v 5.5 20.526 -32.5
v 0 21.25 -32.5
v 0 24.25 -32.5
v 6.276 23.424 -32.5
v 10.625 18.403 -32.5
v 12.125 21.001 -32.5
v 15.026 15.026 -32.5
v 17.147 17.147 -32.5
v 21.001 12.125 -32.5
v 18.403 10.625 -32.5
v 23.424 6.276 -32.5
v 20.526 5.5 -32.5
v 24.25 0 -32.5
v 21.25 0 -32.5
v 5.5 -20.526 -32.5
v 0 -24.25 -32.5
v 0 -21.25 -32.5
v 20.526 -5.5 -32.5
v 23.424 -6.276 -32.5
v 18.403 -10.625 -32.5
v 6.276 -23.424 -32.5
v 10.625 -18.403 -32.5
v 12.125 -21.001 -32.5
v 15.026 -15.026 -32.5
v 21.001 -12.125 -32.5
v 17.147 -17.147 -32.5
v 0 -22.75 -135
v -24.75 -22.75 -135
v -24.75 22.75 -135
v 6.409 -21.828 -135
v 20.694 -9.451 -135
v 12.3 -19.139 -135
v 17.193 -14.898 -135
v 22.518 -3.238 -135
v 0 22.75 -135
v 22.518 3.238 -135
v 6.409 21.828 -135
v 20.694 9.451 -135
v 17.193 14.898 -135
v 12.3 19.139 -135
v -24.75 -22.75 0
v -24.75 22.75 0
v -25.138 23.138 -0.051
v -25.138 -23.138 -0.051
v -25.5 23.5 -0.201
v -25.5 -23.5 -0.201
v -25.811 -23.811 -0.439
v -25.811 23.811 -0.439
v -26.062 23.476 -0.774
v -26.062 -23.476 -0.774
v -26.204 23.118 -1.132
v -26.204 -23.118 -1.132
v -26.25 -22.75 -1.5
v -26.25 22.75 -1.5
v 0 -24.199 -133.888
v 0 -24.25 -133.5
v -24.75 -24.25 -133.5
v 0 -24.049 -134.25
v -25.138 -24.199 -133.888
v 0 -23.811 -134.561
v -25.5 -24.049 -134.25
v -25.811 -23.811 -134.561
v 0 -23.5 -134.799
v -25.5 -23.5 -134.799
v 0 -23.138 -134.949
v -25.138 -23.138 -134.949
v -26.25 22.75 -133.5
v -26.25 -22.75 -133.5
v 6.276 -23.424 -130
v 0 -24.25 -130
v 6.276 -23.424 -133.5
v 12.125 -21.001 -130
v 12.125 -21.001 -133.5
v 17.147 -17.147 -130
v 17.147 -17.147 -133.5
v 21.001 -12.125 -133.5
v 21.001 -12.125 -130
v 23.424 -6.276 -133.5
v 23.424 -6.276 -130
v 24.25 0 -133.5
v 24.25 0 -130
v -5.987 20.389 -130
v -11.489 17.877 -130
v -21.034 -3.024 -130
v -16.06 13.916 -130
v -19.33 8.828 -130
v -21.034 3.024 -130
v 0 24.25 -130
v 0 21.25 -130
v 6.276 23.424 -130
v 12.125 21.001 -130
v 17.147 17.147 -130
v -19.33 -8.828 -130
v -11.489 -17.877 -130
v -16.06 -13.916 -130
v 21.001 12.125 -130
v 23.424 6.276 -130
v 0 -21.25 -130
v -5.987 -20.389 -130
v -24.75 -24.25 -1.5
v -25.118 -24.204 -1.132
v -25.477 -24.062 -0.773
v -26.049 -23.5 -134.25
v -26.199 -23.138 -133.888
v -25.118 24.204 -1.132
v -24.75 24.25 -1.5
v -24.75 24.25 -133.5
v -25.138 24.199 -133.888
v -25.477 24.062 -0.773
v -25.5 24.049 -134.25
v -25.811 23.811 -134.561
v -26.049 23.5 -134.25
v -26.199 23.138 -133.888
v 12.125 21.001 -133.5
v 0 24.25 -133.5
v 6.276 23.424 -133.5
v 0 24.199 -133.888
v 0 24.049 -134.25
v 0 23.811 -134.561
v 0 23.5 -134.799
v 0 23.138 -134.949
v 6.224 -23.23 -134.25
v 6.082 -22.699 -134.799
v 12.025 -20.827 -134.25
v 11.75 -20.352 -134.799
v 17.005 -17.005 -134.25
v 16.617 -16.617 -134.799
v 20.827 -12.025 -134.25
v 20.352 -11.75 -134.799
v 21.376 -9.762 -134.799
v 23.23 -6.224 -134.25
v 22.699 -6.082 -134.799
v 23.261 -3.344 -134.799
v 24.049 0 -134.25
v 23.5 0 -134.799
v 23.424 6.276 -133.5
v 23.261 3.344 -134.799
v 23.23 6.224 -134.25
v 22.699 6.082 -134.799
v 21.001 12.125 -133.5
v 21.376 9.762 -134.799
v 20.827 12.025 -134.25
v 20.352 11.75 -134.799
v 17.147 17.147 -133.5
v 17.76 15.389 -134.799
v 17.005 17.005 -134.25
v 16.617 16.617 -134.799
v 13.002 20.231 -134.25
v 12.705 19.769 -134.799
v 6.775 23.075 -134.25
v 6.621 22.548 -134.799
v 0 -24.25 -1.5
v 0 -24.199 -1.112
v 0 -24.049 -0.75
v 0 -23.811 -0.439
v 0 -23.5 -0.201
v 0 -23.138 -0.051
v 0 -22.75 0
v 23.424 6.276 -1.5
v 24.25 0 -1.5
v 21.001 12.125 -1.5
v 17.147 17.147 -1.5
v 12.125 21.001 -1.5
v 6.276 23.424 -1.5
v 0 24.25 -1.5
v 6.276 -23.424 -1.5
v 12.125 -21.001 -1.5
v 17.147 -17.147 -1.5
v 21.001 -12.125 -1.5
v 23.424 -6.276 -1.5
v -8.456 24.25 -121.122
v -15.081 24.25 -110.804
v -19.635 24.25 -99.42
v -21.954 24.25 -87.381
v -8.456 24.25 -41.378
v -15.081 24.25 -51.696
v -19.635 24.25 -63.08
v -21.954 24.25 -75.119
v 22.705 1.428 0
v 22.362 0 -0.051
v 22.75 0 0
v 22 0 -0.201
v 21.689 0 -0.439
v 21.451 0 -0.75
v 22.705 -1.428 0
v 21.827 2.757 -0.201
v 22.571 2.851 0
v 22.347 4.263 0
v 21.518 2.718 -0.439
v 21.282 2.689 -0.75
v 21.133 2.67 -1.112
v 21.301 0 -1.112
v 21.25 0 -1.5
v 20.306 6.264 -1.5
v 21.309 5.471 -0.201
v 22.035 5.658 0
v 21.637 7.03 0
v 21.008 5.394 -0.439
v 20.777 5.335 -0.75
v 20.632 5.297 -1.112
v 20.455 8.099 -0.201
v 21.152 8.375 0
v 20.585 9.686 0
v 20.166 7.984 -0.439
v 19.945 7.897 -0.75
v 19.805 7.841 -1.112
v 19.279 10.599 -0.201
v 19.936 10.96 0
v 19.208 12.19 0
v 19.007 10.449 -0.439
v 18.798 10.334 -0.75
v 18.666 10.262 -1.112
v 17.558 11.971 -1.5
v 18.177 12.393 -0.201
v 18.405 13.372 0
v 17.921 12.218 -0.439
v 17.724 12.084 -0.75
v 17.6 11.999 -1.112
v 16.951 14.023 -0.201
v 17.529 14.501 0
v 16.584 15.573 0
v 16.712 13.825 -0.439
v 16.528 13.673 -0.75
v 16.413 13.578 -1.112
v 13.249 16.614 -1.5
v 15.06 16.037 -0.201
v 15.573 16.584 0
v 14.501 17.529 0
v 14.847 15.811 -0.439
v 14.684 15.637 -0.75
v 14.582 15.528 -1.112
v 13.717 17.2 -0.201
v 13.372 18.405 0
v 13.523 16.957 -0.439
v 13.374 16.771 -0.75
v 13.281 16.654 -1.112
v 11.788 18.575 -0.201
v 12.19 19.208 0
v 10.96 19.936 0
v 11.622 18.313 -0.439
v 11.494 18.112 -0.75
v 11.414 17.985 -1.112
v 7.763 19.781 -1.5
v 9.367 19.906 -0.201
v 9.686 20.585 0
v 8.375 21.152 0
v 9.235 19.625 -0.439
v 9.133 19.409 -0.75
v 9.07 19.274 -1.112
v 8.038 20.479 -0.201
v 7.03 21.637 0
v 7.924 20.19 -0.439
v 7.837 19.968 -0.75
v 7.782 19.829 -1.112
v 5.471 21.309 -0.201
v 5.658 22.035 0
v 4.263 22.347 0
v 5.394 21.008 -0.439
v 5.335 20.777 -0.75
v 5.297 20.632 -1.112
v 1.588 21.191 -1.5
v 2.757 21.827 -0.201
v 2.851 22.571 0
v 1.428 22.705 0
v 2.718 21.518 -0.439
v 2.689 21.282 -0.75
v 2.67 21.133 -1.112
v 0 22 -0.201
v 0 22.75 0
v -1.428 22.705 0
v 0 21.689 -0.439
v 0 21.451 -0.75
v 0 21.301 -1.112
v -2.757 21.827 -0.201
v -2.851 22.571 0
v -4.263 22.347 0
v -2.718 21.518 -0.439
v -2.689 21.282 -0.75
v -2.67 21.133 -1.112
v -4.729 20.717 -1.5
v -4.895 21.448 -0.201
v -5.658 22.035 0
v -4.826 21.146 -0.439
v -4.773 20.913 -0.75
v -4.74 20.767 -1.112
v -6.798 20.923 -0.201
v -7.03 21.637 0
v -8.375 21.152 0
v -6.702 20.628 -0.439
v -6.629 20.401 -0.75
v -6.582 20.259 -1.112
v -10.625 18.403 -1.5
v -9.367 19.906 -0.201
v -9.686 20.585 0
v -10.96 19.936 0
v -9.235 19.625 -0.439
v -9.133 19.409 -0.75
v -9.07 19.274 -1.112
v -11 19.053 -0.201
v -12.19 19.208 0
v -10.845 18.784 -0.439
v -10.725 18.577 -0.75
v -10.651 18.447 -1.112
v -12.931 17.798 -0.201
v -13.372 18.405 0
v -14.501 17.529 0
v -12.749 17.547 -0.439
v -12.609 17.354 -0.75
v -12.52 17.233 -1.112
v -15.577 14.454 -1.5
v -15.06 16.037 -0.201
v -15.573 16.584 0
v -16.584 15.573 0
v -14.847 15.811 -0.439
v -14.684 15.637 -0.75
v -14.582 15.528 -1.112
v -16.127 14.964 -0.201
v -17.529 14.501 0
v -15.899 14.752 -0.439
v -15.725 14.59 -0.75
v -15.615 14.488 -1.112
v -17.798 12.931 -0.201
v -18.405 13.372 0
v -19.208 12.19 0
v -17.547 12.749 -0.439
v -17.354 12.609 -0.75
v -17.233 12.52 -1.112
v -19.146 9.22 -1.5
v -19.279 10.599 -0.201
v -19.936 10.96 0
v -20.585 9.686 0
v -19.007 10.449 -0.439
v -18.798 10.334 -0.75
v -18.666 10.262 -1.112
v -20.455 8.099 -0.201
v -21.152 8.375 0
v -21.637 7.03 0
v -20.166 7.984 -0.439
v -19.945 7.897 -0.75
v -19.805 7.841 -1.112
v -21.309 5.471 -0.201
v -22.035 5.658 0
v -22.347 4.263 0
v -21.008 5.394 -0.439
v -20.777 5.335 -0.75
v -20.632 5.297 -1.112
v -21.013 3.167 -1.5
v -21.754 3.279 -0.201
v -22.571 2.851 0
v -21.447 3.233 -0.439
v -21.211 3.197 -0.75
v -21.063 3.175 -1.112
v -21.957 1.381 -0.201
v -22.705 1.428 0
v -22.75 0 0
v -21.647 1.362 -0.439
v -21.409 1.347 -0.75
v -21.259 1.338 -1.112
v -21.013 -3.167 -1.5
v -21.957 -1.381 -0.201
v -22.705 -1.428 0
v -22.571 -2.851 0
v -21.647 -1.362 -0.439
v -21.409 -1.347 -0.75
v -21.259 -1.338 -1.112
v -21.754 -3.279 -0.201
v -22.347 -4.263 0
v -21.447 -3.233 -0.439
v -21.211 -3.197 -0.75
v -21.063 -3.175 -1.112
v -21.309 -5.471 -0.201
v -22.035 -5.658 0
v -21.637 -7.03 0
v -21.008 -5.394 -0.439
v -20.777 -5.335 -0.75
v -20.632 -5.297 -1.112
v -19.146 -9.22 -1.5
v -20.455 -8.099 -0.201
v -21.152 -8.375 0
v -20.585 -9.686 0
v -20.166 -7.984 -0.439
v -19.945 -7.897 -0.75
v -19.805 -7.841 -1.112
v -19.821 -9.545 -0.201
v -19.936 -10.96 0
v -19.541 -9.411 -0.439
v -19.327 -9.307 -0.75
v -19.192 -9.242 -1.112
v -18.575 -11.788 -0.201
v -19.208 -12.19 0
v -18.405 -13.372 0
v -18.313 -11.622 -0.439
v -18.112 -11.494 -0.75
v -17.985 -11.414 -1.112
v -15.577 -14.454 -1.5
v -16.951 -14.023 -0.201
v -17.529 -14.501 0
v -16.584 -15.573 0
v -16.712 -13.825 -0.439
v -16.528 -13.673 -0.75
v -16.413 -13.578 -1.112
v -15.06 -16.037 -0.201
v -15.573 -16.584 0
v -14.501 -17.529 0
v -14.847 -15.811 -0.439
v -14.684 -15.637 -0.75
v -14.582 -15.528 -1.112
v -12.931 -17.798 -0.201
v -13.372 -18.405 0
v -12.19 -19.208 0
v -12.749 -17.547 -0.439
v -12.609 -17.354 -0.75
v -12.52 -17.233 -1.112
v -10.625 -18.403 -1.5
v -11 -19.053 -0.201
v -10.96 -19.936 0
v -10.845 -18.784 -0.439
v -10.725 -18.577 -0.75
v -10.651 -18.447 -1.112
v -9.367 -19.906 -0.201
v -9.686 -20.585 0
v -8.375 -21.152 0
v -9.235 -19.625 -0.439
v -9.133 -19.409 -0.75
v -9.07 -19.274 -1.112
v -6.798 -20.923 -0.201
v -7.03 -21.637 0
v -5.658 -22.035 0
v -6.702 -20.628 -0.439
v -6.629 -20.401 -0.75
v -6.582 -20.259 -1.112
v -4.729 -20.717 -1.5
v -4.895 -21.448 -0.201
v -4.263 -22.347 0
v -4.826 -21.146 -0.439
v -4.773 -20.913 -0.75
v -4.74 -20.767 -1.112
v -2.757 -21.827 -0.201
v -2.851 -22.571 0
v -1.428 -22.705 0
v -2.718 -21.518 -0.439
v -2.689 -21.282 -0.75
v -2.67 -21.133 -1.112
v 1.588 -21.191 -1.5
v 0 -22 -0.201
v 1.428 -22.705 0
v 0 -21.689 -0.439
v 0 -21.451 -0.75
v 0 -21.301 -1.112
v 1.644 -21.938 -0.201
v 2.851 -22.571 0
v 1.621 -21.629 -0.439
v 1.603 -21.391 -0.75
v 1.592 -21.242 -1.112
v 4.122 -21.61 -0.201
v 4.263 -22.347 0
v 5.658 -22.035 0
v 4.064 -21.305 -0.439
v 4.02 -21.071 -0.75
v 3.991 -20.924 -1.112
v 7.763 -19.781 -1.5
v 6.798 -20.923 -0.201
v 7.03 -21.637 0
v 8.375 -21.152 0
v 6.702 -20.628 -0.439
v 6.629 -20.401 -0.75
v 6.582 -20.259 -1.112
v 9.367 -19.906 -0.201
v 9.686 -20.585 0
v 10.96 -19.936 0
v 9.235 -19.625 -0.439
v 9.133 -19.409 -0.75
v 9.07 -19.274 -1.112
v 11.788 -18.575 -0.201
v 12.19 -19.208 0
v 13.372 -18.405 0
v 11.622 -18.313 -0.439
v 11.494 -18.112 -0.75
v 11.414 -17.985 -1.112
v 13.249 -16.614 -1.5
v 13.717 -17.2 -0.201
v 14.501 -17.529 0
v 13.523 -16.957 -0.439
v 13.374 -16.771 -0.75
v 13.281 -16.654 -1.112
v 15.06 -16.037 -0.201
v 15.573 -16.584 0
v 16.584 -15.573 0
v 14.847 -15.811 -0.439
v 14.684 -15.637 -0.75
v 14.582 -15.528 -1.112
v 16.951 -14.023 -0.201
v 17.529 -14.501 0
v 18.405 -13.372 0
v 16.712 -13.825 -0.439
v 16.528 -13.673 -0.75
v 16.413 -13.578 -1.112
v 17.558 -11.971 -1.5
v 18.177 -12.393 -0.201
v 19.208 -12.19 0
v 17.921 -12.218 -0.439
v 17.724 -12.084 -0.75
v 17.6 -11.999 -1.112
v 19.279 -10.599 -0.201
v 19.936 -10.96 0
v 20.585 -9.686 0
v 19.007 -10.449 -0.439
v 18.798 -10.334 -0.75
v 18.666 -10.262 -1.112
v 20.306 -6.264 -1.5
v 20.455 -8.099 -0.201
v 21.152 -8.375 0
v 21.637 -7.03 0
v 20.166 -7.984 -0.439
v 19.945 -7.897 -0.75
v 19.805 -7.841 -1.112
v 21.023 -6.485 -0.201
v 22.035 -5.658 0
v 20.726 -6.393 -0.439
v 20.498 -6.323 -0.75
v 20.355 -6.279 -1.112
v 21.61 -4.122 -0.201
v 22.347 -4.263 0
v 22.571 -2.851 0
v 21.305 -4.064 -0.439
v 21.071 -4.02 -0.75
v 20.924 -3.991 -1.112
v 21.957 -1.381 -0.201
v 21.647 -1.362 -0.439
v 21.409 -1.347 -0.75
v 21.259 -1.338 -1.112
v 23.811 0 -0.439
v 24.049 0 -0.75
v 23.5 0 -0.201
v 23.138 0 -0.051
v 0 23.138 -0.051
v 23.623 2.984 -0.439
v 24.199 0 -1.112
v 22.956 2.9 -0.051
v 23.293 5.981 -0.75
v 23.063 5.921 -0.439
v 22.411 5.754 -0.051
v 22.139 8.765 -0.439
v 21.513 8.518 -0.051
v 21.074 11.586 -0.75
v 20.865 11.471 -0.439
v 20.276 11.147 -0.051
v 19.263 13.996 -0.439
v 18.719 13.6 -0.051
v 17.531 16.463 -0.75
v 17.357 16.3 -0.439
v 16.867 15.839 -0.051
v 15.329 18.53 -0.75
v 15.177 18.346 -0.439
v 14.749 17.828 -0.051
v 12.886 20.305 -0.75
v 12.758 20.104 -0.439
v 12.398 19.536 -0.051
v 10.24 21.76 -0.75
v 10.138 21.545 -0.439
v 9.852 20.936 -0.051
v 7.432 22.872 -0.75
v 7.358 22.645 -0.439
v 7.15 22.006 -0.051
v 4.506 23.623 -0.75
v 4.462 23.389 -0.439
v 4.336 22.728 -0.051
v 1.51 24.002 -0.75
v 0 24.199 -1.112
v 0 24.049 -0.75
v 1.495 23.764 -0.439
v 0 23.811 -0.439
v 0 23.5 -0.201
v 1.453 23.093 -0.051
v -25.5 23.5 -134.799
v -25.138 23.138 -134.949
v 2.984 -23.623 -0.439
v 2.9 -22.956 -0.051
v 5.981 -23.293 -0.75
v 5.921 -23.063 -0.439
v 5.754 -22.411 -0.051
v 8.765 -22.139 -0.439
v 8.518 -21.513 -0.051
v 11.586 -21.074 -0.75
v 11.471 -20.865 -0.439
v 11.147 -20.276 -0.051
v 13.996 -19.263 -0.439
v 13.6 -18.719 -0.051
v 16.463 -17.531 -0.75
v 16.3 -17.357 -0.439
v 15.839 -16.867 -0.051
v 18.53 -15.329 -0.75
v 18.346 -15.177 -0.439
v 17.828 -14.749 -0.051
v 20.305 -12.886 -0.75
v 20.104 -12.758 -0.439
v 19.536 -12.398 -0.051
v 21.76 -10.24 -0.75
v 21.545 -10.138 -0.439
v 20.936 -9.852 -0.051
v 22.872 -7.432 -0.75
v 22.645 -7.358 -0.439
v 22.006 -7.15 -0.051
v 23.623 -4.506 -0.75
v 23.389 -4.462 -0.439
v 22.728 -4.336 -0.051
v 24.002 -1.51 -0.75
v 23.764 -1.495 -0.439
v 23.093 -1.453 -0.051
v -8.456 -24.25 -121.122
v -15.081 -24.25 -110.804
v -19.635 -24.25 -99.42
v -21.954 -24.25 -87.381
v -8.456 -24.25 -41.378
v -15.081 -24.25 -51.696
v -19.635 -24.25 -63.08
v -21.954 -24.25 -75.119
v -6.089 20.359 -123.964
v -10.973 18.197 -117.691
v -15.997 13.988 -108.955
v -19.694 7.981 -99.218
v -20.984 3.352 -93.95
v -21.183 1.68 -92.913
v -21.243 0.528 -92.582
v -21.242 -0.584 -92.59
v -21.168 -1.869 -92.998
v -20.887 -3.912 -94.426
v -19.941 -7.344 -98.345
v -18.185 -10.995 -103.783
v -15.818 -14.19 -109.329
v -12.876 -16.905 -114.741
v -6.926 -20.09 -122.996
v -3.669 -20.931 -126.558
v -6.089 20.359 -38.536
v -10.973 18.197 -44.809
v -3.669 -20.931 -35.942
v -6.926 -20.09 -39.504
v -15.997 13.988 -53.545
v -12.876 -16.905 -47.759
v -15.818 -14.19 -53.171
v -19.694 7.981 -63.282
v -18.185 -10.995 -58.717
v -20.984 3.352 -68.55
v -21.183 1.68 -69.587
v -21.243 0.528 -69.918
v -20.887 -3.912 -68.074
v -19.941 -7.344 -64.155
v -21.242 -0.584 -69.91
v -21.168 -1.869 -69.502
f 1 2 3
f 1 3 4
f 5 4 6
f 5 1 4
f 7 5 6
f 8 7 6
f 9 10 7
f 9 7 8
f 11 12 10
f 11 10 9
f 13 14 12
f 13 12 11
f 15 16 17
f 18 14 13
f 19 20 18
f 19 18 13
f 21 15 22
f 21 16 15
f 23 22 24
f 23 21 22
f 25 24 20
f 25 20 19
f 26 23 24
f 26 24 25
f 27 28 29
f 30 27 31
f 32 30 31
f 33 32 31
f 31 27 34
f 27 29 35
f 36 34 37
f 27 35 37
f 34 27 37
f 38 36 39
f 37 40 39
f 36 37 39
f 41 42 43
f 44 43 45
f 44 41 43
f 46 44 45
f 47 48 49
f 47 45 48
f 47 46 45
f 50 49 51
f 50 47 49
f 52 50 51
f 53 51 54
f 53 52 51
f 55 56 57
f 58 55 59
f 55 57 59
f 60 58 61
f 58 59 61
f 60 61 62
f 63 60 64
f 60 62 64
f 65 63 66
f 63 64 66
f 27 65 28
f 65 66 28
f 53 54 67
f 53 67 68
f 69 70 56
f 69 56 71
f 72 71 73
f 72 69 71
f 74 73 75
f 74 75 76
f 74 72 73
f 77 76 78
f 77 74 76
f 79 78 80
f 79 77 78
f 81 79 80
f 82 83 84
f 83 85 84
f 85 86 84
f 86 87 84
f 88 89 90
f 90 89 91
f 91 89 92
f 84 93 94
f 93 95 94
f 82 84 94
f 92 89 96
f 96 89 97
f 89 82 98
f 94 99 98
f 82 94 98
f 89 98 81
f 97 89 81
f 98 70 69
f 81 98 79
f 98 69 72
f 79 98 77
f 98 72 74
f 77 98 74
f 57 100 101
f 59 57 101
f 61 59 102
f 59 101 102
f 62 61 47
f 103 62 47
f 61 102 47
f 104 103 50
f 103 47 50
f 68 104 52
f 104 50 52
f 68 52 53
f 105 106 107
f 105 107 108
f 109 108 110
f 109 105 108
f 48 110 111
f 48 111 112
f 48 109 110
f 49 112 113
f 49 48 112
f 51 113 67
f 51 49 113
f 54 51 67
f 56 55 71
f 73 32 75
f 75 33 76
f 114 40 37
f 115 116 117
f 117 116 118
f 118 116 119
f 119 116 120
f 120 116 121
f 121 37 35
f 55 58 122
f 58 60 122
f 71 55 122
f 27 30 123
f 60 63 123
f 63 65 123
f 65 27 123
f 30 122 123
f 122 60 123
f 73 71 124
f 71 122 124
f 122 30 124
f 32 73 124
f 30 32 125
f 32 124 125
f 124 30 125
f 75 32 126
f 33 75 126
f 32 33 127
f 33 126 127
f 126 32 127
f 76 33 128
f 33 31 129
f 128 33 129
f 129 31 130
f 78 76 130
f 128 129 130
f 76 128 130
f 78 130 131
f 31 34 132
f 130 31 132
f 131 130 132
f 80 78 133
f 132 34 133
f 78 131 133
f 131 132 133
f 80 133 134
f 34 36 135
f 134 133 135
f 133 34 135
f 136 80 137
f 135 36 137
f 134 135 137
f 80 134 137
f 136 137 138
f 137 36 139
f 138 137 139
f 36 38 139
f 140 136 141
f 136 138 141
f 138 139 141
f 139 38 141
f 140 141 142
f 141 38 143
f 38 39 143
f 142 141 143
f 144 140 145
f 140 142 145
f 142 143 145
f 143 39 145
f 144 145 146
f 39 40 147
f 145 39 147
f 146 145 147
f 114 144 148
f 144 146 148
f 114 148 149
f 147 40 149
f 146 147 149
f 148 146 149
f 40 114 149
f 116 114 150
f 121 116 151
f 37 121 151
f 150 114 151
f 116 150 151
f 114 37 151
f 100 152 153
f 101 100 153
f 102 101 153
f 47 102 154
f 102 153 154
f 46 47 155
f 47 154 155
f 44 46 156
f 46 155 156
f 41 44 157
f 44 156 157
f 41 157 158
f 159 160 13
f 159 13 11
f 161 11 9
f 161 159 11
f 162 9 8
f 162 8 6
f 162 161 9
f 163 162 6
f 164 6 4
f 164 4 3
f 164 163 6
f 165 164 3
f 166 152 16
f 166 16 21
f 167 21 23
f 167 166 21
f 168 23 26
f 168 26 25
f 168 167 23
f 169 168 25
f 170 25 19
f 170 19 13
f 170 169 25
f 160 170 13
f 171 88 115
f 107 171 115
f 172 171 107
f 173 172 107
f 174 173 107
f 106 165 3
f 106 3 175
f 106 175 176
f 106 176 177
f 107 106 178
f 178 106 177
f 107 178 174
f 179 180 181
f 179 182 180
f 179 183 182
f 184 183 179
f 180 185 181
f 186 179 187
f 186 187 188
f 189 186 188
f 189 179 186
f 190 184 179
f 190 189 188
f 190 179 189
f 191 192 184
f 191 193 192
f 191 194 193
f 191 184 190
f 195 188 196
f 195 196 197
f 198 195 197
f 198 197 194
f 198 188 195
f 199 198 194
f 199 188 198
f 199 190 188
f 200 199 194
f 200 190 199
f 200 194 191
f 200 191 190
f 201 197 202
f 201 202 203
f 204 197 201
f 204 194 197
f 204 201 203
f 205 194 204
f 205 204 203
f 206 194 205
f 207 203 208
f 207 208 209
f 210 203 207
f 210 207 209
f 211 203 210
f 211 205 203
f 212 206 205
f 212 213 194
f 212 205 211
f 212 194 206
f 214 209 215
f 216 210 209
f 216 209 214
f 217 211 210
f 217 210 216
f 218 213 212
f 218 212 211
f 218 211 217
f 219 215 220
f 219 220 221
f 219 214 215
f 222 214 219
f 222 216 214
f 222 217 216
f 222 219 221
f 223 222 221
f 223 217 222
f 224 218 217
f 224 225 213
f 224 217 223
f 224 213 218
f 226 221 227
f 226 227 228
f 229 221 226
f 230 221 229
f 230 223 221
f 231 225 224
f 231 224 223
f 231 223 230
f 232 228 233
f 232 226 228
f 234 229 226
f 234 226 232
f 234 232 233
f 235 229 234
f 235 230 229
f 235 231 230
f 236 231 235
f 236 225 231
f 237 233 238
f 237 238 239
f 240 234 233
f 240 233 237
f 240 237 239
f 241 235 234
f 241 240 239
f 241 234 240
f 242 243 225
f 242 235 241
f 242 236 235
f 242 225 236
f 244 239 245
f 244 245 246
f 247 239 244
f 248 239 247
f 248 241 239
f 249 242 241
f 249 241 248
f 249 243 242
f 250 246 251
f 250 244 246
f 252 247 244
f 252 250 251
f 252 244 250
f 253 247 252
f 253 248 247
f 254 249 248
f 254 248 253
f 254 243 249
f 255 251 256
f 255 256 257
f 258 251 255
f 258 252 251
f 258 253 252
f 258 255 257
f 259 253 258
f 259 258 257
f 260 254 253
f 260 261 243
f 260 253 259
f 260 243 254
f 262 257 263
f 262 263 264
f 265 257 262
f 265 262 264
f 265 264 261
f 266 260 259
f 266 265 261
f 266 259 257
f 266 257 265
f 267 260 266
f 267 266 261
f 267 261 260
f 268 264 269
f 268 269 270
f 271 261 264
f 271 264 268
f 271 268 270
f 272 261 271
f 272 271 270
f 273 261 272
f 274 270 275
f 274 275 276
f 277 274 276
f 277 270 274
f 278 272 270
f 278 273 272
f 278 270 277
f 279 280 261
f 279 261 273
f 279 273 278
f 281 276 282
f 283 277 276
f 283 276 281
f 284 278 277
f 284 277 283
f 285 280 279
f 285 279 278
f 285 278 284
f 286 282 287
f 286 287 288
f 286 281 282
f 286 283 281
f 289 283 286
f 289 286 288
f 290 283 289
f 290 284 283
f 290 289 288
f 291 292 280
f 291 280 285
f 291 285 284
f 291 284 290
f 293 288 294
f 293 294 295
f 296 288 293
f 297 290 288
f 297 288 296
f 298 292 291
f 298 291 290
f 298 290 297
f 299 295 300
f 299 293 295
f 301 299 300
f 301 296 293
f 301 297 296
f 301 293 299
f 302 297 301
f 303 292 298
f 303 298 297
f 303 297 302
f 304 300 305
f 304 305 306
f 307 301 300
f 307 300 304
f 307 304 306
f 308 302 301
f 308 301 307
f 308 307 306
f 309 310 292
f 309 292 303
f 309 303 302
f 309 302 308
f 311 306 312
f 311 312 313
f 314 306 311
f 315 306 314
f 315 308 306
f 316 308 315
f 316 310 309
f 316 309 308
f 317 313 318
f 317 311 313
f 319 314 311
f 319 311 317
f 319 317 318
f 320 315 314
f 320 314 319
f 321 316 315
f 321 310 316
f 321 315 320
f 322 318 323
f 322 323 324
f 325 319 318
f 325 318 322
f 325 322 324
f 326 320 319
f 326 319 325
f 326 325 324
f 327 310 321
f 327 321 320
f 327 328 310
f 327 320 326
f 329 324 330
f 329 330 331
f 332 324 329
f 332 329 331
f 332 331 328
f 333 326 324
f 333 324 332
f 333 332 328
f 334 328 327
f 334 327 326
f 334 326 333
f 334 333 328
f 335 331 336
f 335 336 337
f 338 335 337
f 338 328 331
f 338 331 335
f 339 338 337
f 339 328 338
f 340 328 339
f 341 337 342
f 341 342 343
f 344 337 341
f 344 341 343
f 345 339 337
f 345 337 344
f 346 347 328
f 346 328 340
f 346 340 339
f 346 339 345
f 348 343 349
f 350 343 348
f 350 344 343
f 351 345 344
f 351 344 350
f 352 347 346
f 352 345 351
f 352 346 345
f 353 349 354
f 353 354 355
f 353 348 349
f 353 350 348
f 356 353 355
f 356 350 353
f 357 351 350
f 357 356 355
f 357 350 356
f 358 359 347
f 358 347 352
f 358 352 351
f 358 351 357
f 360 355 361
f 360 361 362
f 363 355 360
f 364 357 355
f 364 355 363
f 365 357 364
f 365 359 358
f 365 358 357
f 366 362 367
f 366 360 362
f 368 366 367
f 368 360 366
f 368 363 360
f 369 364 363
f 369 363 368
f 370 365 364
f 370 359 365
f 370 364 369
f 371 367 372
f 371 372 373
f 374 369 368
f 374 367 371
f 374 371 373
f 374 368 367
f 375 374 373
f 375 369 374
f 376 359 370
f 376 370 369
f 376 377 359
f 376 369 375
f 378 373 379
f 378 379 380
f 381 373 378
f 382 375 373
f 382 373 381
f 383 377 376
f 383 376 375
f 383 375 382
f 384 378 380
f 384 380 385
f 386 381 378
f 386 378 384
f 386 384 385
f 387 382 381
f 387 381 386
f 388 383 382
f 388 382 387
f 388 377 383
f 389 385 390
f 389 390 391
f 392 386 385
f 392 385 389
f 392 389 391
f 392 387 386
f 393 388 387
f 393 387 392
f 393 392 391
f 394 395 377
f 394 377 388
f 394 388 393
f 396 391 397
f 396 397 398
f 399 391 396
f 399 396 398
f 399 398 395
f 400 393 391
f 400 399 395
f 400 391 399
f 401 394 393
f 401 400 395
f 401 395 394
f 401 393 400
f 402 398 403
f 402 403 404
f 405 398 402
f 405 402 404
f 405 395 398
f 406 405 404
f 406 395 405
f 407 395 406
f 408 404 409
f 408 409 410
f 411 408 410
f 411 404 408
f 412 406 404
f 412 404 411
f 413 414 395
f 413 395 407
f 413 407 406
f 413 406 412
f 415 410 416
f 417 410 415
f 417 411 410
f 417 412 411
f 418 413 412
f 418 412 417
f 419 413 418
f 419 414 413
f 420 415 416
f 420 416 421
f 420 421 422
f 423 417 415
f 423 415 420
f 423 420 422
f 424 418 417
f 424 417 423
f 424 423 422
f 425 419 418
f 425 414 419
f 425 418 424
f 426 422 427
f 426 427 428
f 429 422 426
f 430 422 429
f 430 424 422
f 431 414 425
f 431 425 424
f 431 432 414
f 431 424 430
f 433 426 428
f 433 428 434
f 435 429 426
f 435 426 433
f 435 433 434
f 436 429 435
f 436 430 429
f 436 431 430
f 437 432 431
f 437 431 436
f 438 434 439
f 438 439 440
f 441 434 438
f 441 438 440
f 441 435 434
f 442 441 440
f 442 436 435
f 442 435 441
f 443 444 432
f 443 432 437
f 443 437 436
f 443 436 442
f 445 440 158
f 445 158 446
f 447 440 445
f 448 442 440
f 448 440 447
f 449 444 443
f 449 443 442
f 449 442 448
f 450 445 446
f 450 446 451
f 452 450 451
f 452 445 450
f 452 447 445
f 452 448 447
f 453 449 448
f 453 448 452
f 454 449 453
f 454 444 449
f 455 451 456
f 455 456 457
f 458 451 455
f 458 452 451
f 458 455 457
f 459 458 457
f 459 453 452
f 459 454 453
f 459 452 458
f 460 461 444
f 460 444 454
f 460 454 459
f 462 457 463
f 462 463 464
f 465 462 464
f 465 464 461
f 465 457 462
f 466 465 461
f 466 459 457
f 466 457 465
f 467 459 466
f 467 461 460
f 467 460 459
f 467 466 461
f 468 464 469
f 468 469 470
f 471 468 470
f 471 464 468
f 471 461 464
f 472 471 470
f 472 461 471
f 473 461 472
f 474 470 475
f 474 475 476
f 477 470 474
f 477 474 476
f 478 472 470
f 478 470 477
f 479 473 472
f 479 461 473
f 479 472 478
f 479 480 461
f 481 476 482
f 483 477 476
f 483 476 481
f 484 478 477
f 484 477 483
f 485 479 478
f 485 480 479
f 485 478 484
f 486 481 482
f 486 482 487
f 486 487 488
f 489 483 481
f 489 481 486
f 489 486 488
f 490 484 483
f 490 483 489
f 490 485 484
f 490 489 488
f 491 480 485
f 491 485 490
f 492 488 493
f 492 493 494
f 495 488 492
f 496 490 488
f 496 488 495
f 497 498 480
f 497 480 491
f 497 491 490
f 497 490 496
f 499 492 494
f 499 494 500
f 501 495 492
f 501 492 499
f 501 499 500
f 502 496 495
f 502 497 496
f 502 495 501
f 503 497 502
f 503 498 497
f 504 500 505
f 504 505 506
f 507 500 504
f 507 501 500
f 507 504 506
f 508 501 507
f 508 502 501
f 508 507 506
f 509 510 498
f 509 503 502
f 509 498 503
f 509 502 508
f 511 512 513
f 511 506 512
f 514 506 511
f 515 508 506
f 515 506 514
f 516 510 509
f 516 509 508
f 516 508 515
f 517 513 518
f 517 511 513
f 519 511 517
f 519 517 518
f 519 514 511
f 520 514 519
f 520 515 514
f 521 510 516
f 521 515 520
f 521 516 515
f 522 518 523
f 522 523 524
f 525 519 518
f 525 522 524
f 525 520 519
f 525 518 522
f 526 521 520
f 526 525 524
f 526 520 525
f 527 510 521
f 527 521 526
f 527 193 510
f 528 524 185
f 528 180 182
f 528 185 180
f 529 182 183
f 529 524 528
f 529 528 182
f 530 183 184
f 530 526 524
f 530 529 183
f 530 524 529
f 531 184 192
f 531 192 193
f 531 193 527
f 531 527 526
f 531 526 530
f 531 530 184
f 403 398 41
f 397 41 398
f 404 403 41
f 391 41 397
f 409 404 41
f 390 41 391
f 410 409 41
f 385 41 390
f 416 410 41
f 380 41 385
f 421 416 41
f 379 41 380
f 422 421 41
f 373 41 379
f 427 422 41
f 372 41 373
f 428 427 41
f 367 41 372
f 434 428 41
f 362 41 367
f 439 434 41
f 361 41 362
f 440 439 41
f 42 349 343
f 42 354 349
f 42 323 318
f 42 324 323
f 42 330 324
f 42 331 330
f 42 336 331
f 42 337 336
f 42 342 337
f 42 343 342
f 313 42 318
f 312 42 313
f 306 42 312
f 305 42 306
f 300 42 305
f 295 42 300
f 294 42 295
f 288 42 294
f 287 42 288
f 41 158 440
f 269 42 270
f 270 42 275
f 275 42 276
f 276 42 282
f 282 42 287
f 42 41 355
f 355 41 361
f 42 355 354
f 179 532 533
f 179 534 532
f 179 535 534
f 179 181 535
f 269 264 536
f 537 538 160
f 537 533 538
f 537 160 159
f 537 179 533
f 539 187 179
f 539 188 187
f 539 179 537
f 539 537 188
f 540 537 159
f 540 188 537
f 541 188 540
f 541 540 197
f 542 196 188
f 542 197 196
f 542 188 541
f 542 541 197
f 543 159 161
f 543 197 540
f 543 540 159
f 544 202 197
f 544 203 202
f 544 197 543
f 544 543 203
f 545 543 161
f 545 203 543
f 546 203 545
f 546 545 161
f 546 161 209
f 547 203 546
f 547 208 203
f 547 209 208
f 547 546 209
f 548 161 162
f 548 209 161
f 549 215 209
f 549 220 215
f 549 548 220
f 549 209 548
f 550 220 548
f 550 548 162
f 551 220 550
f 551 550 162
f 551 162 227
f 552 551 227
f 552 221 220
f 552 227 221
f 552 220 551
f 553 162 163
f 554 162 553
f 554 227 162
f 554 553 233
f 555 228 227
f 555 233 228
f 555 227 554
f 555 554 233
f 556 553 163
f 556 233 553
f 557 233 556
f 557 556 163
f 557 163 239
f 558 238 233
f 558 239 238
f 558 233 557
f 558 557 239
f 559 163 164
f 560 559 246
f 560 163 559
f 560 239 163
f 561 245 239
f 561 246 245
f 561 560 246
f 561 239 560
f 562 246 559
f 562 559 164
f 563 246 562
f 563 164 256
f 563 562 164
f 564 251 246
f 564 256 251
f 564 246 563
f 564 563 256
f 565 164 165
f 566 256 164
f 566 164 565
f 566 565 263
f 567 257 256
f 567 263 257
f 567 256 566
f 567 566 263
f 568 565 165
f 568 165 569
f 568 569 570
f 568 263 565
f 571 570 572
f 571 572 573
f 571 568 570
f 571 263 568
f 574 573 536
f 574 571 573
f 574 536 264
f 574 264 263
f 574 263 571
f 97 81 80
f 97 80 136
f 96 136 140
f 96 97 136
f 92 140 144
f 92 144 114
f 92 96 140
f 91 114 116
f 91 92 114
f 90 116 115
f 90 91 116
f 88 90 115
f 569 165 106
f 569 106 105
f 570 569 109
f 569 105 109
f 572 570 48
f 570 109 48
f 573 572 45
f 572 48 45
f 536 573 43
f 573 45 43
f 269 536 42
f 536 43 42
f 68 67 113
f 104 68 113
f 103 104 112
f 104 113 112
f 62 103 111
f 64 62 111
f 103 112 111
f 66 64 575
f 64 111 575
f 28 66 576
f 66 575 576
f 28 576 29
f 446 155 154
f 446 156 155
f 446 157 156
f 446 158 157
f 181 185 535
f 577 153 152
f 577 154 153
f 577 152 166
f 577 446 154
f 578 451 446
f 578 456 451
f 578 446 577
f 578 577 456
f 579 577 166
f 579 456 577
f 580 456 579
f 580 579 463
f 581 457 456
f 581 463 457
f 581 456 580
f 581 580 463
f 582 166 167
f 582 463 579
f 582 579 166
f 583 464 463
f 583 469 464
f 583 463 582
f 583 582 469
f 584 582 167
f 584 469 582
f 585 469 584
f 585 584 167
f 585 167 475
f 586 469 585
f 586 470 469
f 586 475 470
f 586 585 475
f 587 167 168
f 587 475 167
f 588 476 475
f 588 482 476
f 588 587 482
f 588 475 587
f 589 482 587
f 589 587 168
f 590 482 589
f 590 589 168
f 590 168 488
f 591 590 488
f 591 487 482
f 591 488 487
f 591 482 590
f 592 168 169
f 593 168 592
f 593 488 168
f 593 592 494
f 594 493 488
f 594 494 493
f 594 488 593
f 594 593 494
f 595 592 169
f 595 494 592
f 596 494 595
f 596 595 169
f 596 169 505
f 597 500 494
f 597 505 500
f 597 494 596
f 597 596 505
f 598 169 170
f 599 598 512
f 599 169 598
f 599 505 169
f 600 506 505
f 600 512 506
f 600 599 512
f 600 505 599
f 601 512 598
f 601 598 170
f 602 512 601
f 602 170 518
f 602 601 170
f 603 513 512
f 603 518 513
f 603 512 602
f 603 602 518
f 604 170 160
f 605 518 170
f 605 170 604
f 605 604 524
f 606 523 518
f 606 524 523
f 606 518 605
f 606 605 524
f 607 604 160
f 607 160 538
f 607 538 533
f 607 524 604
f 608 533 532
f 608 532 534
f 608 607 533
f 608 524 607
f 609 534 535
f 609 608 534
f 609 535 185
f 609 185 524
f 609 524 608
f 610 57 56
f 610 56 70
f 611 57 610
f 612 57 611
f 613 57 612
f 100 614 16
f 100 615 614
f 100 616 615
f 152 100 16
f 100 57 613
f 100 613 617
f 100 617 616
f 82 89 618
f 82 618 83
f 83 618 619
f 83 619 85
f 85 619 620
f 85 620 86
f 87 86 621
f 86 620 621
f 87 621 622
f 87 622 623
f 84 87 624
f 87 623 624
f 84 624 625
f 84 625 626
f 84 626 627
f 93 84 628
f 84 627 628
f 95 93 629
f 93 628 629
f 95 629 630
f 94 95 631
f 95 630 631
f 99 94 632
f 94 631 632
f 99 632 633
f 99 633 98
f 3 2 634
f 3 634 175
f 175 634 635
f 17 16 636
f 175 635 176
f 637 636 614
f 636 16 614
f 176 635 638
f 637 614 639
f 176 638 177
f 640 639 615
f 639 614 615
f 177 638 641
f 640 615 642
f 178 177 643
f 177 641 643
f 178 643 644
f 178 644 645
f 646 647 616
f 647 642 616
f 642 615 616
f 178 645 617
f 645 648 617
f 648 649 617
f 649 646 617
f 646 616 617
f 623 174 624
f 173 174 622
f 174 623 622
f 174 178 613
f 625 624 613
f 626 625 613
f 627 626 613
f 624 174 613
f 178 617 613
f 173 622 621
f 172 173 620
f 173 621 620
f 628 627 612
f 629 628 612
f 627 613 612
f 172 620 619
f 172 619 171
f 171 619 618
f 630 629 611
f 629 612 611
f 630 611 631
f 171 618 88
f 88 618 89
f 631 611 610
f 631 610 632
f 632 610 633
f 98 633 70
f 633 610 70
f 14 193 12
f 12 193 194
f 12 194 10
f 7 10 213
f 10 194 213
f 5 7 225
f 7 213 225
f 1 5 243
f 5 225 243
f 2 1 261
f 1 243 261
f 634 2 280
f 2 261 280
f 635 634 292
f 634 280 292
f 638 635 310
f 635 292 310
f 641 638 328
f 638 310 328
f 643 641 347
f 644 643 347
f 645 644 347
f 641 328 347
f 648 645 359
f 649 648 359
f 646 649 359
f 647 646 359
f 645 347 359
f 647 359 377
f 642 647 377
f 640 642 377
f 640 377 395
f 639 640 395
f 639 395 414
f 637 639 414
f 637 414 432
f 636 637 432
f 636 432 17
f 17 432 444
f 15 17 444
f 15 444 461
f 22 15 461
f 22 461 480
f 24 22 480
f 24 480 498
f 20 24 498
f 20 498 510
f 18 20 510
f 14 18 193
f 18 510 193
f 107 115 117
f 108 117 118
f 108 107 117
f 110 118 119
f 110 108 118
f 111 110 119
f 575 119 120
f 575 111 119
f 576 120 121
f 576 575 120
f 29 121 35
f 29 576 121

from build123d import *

# Parameters (mm, degrees)
F1_DEPTH      = 135
F2_R          = 21.25
F3_DEPTH      = 130
F4_W          = 24.25
F4_H          = 97.5
F5_DEPTH      = 50.1
F5_DEPTH_BACK = 25
F6_R          = 1.49999
F7_T3_DEPTH   = 141.00001
F7_T6_DEPTH   = 56
F7_T9_DEPTH   = 141.00001
F8_T1_DEPTH   = 28.5
F8_T4_ANGLE   = 180


# Not quite as in the source:
# - a fillet or chamfer that OpenCascade refuses, or shapes differently, is made with other operations: its cross-section is extruded or revolved along the edge and cut away or added
# - a fillet or chamfer is up to 0.001 mm smaller than in the source, because OpenCascade refuses the exact size


with BuildPart() as f1:
    # F0 (on Top) → F1 (new body)
    with BuildSketch(Plane.XY):
        with BuildLine():
            ThreePointArc((0, -24.25), (17.1473394438, -17.1473394438), (24.25, 0))
            ThreePointArc((24.25, 0), (17.1473394438, 17.1473394438), (0, 24.25))
            ThreePointArc((0, 24.25), (-24.25, 0), (0, -24.25))
        make_face()
        with BuildLine():
            ThreePointArc((0, -24.25), (-24.25, 0), (0, 24.25))
            Line((0, 24.25), (-26.25, 24.25))
            Line((-26.25, 24.25), (-26.25, -24.25))
            Line((-26.25, -24.25), (0, -24.25))
        make_face()
    extrude(amount=-F1_DEPTH)

    # F2 (on face) → F3 (cut)
    with BuildSketch(Plane.XY):
        Circle(F2_R)
    extrude(amount=-F3_DEPTH, mode=Mode.SUBTRACT)

    # F4 (on face) → F5 (cut, two sides)
    with BuildSketch(Plane.XZ.offset(24.25)) as f5_sk:
        with Locations((12.125, -81.25)):
            Rectangle(F4_W, F4_H)
        with BuildLine():
            Line((0, -130), (0, -32.5))
            ThreePointArc((0, -32.5), (-22.2460263089, -81.25), (0, -130))
        make_face()
    extrude(amount=-F5_DEPTH, mode=Mode.SUBTRACT)
    extrude(f5_sk.sketch, amount=F5_DEPTH_BACK, mode=Mode.SUBTRACT)

    # F6 (radius 1.5 in the source; OpenCascade refuses exactly that, so slightly less here)
    f6_edges = [f1.edges().sort_by_distance(p)[0] for p in [
        (24.25, 0, 0),
        (-13.125, -24.25, 0),
        (-13.125, 24.25, 0),
        (-26.25, 0, 0),
        (-21.25, 0, 0),
    ]]
    fillet(f6_edges, radius=F6_R)

    # F7: fillet of radius 1.5 on 4 edges, made by hand


with BuildPart() as f7_tool1:
    # F7_s2 → F7_t3 (new body)
    with BuildSketch(Plane.XY.offset(2.25001)):
        with BuildLine():
            ThreePointArc((-24.75, 24.25), (-25.8106601718, 23.8106601718), (-26.25, 22.75))
            Line((-26.25, 22.75), (-26.25, 24.25))
            Line((-26.25, 24.25), (-24.75, 24.25))
        make_face()
    extrude(amount=-F7_T3_DEPTH)


with BuildPart() as f7_tool4:
    # F7_s5 → F7_t6 (new body)
    with BuildSketch(Plane.XZ.offset(-28)):
        with BuildLine():
            ThreePointArc((-26.25, -133.5), (-25.8106601718, -134.5606601718), (-24.75, -135))
            Line((-24.75, -135), (-26.25, -135))
            Line((-26.25, -135), (-26.25, -133.5))
        make_face()
    extrude(amount=F7_T6_DEPTH)


with BuildPart() as f7_tool7:
    # F7_s8 → F7_t9 (new body)
    with BuildSketch(Plane.XY.offset(2.25001)):
        with BuildLine():
            ThreePointArc((-24.75, -24.25), (-25.8106601718, -23.8106601718), (-26.25, -22.75))
            Line((-26.25, -22.75), (-26.25, -24.25))
            Line((-26.25, -24.25), (-24.75, -24.25))
        make_face()
    extrude(amount=-F7_T9_DEPTH)


with BuildPart() as f1_1:
    add(f1.part)

    # F7_t10: cut F7_tool1, F7_tool4, F7_tool7
    add([f7_tool1.part, f7_tool4.part, f7_tool7.part], mode=Mode.SUBTRACT)

    # F8: fillet of radius 1.5 on 4 edges, made by hand

    # F8_s2 → F8_t1 (cut)
    with BuildSketch(Plane.YZ.offset(-28.5)):
        with BuildLine():
            ThreePointArc((-24.25, -133.5), (-23.8106601718, -134.5606601718), (-22.75, -135))
            Line((-22.75, -135), (-24.25, -135))
            Line((-24.25, -135), (-24.25, -133.5))
        make_face()
        with BuildLine():
            ThreePointArc((24.25, -133.5), (23.8106601718, -134.5606601718), (22.75, -135))
            Line((22.75, -135), (24.25, -135))
            Line((24.25, -135), (24.25, -133.5))
        make_face()
    extrude(amount=F8_T1_DEPTH, mode=Mode.SUBTRACT)

    # F8_s3 → F8_t4 (revolve, cut)
    with BuildSketch(Plane.YZ):
        with BuildLine():
            ThreePointArc((-24.25, -133.5), (-23.8106601718, -134.5606601718), (-22.75, -135))
            Line((-22.75, -135), (-24.25, -135))
            Line((-24.25, -135), (-24.25, -133.5))
        make_face()
    revolve(axis=Axis((0, 0, -135), (0, 0, 1)), revolution_arc=F8_T4_ANGLE, mode=Mode.SUBTRACT)


solid = f1_1.part
